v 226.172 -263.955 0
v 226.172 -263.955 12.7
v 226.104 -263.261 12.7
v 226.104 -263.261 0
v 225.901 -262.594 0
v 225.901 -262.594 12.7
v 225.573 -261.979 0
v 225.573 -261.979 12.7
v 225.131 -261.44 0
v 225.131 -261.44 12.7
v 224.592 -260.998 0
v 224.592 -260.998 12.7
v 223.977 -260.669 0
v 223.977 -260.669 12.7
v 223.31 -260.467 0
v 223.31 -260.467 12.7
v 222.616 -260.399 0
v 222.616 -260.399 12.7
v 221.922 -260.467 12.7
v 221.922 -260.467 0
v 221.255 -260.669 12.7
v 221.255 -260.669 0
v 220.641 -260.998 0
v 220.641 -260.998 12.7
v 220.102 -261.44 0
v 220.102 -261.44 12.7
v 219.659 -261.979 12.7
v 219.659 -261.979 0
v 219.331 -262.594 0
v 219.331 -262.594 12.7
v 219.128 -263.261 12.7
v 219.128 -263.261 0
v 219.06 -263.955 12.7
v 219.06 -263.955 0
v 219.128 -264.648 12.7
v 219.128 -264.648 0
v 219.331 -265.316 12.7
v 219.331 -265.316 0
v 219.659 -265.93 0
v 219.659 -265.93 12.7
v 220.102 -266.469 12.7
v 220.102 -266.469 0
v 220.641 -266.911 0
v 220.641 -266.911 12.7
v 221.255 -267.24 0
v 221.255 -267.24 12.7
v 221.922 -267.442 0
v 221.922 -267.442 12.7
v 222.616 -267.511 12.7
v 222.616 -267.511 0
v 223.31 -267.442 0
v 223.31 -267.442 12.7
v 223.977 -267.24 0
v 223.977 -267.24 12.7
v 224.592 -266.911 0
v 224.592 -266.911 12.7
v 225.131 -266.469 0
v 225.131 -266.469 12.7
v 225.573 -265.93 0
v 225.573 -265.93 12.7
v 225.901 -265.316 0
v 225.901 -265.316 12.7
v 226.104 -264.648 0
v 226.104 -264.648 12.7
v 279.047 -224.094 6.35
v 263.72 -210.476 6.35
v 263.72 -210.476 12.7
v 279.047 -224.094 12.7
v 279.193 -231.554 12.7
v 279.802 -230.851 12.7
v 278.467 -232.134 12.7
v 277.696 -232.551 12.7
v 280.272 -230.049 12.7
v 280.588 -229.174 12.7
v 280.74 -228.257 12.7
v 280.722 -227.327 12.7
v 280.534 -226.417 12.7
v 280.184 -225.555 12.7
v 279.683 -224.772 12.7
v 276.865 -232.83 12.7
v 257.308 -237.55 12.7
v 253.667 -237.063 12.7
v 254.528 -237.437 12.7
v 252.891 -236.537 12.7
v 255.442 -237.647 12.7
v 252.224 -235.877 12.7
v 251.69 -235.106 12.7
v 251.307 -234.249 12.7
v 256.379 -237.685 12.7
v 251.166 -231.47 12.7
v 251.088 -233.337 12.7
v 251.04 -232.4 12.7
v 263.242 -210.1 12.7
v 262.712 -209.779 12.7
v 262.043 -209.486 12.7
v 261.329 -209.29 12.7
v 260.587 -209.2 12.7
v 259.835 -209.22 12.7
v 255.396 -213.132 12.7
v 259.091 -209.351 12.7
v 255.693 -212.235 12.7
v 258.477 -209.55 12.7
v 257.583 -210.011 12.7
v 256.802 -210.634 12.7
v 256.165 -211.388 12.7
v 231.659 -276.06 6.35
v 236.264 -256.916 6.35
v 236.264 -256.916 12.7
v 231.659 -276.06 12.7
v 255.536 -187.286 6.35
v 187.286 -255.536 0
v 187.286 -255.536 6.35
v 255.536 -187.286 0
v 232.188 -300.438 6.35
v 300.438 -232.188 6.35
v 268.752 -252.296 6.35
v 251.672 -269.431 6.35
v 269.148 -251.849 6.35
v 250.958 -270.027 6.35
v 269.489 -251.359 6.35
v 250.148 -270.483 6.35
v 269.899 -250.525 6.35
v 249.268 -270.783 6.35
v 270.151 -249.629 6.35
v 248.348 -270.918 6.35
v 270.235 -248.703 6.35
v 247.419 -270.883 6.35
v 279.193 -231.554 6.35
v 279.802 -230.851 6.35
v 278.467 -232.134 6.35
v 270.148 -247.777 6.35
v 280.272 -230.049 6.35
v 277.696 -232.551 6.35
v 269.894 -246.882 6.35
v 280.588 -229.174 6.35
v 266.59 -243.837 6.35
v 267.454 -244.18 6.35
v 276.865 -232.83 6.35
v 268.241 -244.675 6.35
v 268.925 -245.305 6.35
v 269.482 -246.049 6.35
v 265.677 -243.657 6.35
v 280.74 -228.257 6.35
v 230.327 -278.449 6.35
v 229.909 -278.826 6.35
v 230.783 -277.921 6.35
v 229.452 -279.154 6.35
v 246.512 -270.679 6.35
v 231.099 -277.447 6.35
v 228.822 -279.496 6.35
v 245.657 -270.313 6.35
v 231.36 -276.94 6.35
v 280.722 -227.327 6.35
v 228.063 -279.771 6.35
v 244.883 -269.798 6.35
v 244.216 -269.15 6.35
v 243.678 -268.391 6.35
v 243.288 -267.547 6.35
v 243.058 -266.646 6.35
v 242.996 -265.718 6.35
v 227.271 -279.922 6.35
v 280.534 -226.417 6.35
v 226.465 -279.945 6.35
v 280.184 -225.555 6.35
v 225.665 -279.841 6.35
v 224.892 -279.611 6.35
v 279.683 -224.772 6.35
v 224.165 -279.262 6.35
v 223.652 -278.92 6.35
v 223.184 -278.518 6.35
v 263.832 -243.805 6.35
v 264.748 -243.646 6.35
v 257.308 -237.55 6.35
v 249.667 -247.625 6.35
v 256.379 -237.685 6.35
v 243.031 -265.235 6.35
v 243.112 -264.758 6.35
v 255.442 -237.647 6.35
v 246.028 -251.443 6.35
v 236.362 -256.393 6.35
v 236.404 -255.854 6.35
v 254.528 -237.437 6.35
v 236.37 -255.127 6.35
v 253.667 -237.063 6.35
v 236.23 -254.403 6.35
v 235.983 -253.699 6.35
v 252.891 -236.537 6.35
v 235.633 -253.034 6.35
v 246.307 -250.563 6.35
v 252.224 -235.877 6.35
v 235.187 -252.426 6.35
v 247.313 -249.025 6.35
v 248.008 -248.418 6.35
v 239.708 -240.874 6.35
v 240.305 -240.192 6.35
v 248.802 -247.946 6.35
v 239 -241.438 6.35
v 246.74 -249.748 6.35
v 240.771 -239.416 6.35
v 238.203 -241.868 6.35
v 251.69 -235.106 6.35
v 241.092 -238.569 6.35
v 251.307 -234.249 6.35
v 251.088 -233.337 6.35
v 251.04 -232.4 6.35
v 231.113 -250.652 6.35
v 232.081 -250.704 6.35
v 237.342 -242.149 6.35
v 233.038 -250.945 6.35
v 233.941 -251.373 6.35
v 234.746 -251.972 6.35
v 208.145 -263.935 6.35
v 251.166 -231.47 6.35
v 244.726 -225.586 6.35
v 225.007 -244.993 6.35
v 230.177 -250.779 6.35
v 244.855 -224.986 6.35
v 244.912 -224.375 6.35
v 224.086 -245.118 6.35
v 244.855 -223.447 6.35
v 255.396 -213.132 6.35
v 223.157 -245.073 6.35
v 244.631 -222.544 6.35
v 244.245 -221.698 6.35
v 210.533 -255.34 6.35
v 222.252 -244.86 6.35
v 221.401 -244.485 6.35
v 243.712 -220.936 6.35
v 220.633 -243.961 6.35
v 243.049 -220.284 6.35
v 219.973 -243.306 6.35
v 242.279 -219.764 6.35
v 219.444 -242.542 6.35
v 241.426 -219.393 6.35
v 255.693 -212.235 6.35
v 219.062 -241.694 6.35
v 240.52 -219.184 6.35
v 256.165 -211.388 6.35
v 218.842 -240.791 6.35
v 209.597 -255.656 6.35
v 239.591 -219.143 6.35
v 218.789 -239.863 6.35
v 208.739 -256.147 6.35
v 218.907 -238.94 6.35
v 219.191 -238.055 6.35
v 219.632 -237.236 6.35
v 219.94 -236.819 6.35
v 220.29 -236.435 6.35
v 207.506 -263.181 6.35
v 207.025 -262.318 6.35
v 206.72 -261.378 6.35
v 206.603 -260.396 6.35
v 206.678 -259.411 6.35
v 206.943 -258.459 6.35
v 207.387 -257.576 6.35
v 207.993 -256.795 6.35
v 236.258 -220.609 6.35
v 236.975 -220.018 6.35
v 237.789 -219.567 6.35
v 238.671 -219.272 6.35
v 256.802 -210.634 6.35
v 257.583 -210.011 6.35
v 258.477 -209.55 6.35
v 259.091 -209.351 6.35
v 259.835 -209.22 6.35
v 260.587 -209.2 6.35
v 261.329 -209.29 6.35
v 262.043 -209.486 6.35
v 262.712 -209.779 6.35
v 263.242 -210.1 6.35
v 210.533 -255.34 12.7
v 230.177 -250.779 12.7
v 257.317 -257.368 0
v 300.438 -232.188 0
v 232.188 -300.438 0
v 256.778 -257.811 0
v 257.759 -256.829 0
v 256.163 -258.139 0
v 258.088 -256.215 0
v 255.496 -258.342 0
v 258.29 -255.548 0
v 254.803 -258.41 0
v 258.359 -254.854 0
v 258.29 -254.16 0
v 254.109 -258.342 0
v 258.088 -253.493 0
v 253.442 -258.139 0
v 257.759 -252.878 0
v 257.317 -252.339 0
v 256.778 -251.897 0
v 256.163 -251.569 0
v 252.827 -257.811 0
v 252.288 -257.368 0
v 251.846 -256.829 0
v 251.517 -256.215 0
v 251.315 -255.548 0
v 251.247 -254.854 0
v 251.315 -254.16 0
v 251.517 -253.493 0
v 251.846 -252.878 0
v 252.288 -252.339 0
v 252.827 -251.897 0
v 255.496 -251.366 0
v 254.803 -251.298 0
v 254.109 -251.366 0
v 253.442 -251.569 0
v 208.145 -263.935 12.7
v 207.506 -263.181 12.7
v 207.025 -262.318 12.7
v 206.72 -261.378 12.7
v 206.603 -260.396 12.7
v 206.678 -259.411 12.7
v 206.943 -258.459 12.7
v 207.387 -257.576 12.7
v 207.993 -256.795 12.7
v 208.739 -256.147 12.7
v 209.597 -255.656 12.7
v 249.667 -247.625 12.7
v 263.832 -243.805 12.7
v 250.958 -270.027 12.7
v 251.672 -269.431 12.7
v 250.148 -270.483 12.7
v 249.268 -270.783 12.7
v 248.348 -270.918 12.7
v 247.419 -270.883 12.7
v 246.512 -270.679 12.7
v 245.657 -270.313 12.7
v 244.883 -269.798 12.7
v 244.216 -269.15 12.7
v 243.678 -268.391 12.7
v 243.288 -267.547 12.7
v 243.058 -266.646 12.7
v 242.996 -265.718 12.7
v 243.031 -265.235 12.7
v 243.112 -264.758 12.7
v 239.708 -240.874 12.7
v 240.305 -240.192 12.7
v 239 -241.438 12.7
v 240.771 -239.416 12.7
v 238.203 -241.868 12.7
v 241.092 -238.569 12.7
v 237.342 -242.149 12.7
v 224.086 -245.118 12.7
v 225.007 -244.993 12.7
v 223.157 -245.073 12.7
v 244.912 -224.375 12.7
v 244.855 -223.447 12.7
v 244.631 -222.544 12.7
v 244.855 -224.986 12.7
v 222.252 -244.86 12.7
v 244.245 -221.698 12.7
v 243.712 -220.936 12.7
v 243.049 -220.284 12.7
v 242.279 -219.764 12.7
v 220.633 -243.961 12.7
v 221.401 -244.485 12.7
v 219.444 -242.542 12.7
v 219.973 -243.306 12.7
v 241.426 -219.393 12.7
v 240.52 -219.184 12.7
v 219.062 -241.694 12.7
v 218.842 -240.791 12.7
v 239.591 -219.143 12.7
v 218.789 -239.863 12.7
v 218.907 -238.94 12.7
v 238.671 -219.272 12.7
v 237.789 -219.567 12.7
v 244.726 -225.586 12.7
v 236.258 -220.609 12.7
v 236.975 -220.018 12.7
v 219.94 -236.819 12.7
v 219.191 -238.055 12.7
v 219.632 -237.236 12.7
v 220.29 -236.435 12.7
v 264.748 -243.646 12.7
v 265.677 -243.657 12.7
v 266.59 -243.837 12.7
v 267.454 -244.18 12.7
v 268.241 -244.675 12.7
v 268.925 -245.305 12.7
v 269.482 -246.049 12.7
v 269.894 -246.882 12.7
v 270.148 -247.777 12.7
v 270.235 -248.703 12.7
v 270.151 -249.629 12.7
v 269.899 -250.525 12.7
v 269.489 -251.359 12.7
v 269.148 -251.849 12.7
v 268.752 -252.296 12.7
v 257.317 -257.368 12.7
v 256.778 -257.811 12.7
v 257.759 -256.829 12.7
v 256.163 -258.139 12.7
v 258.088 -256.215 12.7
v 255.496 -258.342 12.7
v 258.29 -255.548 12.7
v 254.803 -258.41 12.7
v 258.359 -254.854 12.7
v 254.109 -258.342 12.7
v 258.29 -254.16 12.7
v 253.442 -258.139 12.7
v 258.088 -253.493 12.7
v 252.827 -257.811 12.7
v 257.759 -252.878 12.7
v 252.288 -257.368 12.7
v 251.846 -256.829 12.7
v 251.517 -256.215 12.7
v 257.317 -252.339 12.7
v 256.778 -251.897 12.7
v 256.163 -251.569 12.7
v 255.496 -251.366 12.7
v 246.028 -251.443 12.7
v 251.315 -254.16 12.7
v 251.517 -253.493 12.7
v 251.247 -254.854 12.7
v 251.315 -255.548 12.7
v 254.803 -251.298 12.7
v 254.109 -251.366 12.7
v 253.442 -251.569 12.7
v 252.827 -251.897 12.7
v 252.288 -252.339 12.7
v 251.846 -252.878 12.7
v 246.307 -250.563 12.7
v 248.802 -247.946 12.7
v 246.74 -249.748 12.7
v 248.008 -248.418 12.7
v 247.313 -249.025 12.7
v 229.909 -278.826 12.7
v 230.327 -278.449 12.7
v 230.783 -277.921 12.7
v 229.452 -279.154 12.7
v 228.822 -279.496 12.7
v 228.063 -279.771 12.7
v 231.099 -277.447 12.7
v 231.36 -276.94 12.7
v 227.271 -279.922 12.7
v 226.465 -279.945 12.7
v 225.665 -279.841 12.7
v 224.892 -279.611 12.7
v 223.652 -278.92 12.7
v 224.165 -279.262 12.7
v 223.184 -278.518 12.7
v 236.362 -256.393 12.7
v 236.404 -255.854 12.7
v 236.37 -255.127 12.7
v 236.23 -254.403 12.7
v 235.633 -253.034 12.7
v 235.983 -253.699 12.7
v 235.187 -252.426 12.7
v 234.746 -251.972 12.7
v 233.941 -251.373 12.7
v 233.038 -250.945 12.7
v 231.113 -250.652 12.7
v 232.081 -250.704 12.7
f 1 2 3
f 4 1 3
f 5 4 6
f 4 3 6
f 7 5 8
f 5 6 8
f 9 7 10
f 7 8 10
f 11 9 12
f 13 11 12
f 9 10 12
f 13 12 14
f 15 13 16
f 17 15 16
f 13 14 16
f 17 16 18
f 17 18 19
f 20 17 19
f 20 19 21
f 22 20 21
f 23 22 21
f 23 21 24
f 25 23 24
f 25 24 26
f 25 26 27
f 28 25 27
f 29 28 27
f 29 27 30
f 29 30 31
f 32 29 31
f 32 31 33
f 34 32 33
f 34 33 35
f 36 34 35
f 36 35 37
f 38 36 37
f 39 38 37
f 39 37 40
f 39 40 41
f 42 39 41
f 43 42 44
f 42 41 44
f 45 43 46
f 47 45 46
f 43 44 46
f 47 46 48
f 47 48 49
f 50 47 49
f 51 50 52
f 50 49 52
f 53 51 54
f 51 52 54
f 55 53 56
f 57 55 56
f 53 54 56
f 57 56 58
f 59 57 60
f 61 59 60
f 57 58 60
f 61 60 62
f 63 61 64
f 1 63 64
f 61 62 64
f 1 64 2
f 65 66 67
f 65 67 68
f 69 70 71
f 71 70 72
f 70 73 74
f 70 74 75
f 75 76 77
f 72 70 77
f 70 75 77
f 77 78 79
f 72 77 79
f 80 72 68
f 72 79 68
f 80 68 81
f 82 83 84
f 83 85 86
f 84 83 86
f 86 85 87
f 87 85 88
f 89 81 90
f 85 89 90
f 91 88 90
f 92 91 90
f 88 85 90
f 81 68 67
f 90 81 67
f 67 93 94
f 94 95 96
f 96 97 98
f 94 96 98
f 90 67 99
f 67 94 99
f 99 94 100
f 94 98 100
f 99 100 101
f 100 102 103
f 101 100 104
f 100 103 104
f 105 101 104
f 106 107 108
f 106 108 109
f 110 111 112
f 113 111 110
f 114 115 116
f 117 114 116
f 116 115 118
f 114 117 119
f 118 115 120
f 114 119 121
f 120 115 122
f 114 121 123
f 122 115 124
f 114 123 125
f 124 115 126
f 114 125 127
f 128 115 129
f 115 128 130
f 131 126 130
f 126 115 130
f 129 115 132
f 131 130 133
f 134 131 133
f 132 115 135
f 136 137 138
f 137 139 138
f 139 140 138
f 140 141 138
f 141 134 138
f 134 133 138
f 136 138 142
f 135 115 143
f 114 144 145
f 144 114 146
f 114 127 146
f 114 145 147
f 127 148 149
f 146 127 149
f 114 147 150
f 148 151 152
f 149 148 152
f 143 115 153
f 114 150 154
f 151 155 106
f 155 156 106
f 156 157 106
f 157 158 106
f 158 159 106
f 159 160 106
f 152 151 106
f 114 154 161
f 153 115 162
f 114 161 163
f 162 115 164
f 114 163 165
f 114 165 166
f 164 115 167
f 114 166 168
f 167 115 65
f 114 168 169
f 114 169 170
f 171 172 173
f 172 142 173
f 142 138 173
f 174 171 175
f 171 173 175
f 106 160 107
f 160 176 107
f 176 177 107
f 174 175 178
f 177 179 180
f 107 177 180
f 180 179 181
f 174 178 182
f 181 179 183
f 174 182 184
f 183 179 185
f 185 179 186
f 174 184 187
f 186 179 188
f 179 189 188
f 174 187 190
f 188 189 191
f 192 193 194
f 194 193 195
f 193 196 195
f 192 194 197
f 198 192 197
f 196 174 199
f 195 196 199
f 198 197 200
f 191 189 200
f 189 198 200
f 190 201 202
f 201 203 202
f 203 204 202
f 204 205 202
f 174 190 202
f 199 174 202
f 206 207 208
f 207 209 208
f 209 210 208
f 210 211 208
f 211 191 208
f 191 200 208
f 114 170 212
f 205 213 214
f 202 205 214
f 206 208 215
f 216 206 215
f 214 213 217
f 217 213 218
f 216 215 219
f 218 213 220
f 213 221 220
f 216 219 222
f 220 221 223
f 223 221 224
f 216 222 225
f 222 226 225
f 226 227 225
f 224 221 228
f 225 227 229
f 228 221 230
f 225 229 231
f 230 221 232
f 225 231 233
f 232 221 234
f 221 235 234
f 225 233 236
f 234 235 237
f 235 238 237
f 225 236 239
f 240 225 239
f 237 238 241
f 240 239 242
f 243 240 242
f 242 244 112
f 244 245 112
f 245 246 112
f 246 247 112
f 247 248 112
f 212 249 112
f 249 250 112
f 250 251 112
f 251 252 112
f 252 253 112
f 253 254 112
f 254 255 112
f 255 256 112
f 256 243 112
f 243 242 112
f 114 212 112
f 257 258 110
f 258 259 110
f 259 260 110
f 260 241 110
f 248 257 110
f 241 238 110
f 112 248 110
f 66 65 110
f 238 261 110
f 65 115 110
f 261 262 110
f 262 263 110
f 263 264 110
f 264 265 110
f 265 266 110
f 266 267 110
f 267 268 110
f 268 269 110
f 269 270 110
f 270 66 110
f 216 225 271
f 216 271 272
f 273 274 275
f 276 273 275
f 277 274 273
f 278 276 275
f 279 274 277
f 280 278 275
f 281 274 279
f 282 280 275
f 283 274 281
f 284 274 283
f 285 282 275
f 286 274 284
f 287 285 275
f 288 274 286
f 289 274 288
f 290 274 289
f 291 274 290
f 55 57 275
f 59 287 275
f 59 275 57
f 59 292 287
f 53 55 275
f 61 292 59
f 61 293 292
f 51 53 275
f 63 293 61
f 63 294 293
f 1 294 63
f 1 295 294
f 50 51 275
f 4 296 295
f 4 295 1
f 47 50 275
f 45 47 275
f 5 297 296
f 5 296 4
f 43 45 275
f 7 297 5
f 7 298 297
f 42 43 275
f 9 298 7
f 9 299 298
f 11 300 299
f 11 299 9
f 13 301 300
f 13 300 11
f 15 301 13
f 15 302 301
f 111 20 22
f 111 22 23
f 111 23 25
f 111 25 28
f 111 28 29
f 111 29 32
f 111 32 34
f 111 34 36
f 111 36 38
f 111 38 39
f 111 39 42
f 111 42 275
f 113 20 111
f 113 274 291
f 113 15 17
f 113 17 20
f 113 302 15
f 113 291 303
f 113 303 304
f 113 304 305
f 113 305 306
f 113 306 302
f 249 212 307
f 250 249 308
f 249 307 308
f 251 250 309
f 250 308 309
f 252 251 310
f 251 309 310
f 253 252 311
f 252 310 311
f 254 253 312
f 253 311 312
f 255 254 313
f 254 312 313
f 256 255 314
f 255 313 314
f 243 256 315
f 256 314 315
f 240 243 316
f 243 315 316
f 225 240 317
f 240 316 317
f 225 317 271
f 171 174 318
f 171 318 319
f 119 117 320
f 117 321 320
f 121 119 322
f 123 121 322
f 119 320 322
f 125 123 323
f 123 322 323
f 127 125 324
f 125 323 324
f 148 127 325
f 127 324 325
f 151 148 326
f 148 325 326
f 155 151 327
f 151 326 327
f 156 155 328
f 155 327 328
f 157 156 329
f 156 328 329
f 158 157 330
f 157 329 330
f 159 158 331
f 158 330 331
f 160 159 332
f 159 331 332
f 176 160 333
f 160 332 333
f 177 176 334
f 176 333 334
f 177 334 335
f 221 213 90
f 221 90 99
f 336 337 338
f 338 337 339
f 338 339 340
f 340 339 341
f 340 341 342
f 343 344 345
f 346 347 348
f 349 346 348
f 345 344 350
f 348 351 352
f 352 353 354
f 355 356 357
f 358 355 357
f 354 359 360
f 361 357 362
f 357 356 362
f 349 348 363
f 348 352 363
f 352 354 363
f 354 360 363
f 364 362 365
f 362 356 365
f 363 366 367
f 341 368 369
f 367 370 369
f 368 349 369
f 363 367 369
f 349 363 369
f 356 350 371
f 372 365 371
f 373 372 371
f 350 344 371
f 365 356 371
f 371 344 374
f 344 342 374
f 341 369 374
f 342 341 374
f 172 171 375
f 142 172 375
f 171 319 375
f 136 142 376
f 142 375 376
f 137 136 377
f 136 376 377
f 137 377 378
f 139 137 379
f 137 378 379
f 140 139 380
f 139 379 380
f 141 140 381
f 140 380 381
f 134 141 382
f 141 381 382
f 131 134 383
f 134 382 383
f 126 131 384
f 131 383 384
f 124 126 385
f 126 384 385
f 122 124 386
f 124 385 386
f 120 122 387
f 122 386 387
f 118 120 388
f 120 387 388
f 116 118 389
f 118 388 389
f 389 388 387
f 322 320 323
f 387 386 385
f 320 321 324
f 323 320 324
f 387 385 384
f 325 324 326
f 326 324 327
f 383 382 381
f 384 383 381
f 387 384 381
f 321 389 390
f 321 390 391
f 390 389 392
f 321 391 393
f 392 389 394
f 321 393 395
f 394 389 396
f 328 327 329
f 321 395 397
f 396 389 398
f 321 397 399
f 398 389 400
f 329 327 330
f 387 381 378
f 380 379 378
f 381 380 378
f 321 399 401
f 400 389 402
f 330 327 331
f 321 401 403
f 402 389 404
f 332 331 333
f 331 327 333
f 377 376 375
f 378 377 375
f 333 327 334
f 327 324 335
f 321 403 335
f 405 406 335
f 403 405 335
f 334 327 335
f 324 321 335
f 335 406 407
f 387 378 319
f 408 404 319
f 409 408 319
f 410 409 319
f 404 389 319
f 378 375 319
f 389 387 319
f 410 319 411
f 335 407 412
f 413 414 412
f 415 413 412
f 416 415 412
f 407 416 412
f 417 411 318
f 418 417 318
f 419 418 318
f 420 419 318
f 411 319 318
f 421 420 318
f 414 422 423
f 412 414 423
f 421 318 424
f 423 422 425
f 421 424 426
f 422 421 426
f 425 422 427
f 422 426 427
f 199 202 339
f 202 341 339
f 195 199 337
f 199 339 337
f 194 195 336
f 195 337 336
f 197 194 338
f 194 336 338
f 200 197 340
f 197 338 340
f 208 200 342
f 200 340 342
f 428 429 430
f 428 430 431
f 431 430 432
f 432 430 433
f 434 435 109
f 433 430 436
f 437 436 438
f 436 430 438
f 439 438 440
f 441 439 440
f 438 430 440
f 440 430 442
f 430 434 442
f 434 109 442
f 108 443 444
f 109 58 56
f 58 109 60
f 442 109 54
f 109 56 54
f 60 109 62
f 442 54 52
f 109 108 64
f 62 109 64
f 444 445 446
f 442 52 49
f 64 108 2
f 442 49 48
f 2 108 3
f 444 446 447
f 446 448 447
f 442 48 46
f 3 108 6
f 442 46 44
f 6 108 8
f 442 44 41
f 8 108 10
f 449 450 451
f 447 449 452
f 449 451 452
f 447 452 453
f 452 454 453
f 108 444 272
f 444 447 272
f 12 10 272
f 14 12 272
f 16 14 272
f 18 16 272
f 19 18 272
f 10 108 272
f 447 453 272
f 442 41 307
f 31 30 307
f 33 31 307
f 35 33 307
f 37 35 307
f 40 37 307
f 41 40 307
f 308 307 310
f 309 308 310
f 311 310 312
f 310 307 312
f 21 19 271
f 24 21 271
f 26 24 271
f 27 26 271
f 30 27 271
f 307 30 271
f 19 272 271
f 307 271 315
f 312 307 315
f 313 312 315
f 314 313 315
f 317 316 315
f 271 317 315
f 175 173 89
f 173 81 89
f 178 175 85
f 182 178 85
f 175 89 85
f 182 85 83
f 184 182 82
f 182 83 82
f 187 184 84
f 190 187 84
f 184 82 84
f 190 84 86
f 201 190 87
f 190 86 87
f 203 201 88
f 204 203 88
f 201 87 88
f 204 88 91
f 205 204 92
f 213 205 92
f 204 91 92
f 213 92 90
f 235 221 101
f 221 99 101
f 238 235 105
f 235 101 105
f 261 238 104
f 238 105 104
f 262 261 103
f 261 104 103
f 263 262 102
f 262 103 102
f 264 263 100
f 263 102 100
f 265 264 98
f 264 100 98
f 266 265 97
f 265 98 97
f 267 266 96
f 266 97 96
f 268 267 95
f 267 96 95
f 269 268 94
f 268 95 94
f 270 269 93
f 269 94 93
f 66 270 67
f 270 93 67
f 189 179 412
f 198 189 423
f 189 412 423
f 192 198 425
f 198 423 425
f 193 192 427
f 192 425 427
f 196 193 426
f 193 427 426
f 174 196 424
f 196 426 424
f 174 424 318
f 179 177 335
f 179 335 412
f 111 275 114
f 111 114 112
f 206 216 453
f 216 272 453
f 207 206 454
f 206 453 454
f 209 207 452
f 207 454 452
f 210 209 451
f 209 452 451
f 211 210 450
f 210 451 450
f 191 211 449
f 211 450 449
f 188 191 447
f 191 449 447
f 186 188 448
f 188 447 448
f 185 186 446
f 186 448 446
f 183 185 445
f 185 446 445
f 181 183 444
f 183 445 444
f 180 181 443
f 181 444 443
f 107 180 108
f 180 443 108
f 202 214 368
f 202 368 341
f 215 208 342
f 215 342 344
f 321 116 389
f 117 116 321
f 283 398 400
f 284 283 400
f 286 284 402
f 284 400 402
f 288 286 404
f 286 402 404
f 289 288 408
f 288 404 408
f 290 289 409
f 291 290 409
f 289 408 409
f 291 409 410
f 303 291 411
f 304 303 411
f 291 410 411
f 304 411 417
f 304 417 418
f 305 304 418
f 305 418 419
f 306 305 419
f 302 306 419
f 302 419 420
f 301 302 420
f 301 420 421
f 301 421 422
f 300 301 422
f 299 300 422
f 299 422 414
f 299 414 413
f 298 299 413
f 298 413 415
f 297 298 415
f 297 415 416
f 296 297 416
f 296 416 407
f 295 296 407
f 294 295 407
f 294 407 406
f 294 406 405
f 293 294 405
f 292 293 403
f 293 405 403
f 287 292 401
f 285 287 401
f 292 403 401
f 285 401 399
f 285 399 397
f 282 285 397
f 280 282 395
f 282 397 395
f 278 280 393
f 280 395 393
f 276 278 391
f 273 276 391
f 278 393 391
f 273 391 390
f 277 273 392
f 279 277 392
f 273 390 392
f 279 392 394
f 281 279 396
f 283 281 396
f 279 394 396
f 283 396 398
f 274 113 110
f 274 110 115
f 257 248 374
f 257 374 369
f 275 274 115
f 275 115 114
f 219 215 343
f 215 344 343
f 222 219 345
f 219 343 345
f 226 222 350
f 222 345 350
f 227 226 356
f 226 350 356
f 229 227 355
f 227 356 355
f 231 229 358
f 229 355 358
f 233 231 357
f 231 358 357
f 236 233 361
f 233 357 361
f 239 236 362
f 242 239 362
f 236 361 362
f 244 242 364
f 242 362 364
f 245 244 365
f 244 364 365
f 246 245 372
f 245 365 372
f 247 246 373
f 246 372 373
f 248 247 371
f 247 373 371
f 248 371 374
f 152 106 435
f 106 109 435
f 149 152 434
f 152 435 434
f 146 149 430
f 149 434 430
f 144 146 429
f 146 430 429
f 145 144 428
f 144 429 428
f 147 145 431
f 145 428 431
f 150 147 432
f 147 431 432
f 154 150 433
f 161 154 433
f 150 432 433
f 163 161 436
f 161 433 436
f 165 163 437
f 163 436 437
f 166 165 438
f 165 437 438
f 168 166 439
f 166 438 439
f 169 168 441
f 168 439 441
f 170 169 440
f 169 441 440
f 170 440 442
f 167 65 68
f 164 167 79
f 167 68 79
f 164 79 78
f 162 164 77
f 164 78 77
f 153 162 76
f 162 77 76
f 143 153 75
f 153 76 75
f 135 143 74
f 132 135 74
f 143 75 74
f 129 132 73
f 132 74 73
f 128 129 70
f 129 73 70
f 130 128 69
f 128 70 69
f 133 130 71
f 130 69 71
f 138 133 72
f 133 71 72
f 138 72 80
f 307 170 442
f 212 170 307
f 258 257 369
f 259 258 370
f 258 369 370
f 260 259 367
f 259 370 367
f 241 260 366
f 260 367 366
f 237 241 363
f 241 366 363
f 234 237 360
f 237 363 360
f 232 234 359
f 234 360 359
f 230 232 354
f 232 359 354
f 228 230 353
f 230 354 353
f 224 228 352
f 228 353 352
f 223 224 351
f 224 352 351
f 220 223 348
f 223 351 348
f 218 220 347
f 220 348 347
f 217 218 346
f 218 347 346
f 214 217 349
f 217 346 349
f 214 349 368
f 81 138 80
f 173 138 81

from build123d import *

# Parameters (mm, degrees)
BOSS_EXTRUDE1_DEPTH     = 6.35
BOSS_EXTRUDE2_DEPTH     = 6.35
FILLET1_R               = 5.08
SKETCH3_R               = 3.556
CUT_EXTRUDE1_DEPTH      = 1.0000001
CUT_EXTRUDE1_DEPTH_BACK = 13.7


with BuildPart() as part:
    # Sketch1 → Boss-Extrude1 (new body)
    with BuildSketch(Plane.XY):
        Polygon((187.286286244, -255.536232765), (255.536232765, -187.286286244), (300.43751337, -232.18756685), (232.18756685, -300.43751337), align=None)
    extrude(amount=BOSS_EXTRUDE1_DEPTH)

    # Sketch2 → Boss-Extrude2 (add)
    with BuildSketch(Plane(origin=(-122.999277868, -379.350906339, 6.35), x_dir=(1, 0, 0), z_dir=(0, 0, 1))):
        Polygon((358.652446232, 129.843073159), (361.187345435, 130.431571088), (353.631906688, 99.023102123), (352.465526746, 94.616733593), (347.736029271, 99.326506792), (324.454742757, 121.903791925), align=None)
        Polygon((369.84495619, 105.077454433), (362.389303407, 97.597844709), (364.454204898, 107.026485871), (369.687373927, 130.92189838), (389.915729798, 136.377665107), (404.528274707, 139.872219424), align=None)
        Polygon((380.244489791, 174.237534533), (380.323081857, 174.55732413), (406.948495143, 150.901624736), (409.197553318, 148.774137273), (405.612483177, 147.90877996), (372.317989901, 139.872219424), align=None)
        Polygon((371.079053541, 165.746977866), (363.278943376, 137.878777762), (341.260989988, 132.802884769), (330.489965122, 130.230836291), (365.380288676, 164.810357377), (373.055677454, 172.41737391), align=None)
    extrude(amount=BOSS_EXTRUDE2_DEPTH)

    # Fillet1
    fillet1_edges = [part.edges().sort_by_distance(p)[0] for p in [
        (250.056399586, -206.933532429, 9.525),
        (257.323803989, -204.79358221, 9.525),
        (286.19827545, -230.576769066, 9.525),
        (249.318712034, -239.478686915, 9.525),
        (239.390025539, -281.753061631, 9.525),
        (246.688096059, -248.429007959, 9.525),
        (281.528996839, -239.478686915, 9.525),
        (201.455464889, -257.447114414, 9.525),
        (238.188067567, -248.919335251, 9.525),
        (207.490687255, -249.120070049, 9.525),
        (240.279665508, -241.472128577, 9.525),
        (229.466248878, -284.734172747, 9.525),
    ]]
    fillet(fillet1_edges, radius=FILLET1_R)

    # Sketch3 → Cut-Extrude1 (cut, two sides)
    with BuildSketch(Plane.XY.offset(12.7)) as cut_extrude1_sk:
        with Locations((254.802658362, -254.853889617)):
            Circle(SKETCH3_R)
        with Locations((222.616120289, -263.9547)):
            Circle(SKETCH3_R)
    extrude(amount=CUT_EXTRUDE1_DEPTH, mode=Mode.SUBTRACT)
    extrude(cut_extrude1_sk.sketch, amount=-CUT_EXTRUDE1_DEPTH_BACK, mode=Mode.SUBTRACT)


solid = part.part
